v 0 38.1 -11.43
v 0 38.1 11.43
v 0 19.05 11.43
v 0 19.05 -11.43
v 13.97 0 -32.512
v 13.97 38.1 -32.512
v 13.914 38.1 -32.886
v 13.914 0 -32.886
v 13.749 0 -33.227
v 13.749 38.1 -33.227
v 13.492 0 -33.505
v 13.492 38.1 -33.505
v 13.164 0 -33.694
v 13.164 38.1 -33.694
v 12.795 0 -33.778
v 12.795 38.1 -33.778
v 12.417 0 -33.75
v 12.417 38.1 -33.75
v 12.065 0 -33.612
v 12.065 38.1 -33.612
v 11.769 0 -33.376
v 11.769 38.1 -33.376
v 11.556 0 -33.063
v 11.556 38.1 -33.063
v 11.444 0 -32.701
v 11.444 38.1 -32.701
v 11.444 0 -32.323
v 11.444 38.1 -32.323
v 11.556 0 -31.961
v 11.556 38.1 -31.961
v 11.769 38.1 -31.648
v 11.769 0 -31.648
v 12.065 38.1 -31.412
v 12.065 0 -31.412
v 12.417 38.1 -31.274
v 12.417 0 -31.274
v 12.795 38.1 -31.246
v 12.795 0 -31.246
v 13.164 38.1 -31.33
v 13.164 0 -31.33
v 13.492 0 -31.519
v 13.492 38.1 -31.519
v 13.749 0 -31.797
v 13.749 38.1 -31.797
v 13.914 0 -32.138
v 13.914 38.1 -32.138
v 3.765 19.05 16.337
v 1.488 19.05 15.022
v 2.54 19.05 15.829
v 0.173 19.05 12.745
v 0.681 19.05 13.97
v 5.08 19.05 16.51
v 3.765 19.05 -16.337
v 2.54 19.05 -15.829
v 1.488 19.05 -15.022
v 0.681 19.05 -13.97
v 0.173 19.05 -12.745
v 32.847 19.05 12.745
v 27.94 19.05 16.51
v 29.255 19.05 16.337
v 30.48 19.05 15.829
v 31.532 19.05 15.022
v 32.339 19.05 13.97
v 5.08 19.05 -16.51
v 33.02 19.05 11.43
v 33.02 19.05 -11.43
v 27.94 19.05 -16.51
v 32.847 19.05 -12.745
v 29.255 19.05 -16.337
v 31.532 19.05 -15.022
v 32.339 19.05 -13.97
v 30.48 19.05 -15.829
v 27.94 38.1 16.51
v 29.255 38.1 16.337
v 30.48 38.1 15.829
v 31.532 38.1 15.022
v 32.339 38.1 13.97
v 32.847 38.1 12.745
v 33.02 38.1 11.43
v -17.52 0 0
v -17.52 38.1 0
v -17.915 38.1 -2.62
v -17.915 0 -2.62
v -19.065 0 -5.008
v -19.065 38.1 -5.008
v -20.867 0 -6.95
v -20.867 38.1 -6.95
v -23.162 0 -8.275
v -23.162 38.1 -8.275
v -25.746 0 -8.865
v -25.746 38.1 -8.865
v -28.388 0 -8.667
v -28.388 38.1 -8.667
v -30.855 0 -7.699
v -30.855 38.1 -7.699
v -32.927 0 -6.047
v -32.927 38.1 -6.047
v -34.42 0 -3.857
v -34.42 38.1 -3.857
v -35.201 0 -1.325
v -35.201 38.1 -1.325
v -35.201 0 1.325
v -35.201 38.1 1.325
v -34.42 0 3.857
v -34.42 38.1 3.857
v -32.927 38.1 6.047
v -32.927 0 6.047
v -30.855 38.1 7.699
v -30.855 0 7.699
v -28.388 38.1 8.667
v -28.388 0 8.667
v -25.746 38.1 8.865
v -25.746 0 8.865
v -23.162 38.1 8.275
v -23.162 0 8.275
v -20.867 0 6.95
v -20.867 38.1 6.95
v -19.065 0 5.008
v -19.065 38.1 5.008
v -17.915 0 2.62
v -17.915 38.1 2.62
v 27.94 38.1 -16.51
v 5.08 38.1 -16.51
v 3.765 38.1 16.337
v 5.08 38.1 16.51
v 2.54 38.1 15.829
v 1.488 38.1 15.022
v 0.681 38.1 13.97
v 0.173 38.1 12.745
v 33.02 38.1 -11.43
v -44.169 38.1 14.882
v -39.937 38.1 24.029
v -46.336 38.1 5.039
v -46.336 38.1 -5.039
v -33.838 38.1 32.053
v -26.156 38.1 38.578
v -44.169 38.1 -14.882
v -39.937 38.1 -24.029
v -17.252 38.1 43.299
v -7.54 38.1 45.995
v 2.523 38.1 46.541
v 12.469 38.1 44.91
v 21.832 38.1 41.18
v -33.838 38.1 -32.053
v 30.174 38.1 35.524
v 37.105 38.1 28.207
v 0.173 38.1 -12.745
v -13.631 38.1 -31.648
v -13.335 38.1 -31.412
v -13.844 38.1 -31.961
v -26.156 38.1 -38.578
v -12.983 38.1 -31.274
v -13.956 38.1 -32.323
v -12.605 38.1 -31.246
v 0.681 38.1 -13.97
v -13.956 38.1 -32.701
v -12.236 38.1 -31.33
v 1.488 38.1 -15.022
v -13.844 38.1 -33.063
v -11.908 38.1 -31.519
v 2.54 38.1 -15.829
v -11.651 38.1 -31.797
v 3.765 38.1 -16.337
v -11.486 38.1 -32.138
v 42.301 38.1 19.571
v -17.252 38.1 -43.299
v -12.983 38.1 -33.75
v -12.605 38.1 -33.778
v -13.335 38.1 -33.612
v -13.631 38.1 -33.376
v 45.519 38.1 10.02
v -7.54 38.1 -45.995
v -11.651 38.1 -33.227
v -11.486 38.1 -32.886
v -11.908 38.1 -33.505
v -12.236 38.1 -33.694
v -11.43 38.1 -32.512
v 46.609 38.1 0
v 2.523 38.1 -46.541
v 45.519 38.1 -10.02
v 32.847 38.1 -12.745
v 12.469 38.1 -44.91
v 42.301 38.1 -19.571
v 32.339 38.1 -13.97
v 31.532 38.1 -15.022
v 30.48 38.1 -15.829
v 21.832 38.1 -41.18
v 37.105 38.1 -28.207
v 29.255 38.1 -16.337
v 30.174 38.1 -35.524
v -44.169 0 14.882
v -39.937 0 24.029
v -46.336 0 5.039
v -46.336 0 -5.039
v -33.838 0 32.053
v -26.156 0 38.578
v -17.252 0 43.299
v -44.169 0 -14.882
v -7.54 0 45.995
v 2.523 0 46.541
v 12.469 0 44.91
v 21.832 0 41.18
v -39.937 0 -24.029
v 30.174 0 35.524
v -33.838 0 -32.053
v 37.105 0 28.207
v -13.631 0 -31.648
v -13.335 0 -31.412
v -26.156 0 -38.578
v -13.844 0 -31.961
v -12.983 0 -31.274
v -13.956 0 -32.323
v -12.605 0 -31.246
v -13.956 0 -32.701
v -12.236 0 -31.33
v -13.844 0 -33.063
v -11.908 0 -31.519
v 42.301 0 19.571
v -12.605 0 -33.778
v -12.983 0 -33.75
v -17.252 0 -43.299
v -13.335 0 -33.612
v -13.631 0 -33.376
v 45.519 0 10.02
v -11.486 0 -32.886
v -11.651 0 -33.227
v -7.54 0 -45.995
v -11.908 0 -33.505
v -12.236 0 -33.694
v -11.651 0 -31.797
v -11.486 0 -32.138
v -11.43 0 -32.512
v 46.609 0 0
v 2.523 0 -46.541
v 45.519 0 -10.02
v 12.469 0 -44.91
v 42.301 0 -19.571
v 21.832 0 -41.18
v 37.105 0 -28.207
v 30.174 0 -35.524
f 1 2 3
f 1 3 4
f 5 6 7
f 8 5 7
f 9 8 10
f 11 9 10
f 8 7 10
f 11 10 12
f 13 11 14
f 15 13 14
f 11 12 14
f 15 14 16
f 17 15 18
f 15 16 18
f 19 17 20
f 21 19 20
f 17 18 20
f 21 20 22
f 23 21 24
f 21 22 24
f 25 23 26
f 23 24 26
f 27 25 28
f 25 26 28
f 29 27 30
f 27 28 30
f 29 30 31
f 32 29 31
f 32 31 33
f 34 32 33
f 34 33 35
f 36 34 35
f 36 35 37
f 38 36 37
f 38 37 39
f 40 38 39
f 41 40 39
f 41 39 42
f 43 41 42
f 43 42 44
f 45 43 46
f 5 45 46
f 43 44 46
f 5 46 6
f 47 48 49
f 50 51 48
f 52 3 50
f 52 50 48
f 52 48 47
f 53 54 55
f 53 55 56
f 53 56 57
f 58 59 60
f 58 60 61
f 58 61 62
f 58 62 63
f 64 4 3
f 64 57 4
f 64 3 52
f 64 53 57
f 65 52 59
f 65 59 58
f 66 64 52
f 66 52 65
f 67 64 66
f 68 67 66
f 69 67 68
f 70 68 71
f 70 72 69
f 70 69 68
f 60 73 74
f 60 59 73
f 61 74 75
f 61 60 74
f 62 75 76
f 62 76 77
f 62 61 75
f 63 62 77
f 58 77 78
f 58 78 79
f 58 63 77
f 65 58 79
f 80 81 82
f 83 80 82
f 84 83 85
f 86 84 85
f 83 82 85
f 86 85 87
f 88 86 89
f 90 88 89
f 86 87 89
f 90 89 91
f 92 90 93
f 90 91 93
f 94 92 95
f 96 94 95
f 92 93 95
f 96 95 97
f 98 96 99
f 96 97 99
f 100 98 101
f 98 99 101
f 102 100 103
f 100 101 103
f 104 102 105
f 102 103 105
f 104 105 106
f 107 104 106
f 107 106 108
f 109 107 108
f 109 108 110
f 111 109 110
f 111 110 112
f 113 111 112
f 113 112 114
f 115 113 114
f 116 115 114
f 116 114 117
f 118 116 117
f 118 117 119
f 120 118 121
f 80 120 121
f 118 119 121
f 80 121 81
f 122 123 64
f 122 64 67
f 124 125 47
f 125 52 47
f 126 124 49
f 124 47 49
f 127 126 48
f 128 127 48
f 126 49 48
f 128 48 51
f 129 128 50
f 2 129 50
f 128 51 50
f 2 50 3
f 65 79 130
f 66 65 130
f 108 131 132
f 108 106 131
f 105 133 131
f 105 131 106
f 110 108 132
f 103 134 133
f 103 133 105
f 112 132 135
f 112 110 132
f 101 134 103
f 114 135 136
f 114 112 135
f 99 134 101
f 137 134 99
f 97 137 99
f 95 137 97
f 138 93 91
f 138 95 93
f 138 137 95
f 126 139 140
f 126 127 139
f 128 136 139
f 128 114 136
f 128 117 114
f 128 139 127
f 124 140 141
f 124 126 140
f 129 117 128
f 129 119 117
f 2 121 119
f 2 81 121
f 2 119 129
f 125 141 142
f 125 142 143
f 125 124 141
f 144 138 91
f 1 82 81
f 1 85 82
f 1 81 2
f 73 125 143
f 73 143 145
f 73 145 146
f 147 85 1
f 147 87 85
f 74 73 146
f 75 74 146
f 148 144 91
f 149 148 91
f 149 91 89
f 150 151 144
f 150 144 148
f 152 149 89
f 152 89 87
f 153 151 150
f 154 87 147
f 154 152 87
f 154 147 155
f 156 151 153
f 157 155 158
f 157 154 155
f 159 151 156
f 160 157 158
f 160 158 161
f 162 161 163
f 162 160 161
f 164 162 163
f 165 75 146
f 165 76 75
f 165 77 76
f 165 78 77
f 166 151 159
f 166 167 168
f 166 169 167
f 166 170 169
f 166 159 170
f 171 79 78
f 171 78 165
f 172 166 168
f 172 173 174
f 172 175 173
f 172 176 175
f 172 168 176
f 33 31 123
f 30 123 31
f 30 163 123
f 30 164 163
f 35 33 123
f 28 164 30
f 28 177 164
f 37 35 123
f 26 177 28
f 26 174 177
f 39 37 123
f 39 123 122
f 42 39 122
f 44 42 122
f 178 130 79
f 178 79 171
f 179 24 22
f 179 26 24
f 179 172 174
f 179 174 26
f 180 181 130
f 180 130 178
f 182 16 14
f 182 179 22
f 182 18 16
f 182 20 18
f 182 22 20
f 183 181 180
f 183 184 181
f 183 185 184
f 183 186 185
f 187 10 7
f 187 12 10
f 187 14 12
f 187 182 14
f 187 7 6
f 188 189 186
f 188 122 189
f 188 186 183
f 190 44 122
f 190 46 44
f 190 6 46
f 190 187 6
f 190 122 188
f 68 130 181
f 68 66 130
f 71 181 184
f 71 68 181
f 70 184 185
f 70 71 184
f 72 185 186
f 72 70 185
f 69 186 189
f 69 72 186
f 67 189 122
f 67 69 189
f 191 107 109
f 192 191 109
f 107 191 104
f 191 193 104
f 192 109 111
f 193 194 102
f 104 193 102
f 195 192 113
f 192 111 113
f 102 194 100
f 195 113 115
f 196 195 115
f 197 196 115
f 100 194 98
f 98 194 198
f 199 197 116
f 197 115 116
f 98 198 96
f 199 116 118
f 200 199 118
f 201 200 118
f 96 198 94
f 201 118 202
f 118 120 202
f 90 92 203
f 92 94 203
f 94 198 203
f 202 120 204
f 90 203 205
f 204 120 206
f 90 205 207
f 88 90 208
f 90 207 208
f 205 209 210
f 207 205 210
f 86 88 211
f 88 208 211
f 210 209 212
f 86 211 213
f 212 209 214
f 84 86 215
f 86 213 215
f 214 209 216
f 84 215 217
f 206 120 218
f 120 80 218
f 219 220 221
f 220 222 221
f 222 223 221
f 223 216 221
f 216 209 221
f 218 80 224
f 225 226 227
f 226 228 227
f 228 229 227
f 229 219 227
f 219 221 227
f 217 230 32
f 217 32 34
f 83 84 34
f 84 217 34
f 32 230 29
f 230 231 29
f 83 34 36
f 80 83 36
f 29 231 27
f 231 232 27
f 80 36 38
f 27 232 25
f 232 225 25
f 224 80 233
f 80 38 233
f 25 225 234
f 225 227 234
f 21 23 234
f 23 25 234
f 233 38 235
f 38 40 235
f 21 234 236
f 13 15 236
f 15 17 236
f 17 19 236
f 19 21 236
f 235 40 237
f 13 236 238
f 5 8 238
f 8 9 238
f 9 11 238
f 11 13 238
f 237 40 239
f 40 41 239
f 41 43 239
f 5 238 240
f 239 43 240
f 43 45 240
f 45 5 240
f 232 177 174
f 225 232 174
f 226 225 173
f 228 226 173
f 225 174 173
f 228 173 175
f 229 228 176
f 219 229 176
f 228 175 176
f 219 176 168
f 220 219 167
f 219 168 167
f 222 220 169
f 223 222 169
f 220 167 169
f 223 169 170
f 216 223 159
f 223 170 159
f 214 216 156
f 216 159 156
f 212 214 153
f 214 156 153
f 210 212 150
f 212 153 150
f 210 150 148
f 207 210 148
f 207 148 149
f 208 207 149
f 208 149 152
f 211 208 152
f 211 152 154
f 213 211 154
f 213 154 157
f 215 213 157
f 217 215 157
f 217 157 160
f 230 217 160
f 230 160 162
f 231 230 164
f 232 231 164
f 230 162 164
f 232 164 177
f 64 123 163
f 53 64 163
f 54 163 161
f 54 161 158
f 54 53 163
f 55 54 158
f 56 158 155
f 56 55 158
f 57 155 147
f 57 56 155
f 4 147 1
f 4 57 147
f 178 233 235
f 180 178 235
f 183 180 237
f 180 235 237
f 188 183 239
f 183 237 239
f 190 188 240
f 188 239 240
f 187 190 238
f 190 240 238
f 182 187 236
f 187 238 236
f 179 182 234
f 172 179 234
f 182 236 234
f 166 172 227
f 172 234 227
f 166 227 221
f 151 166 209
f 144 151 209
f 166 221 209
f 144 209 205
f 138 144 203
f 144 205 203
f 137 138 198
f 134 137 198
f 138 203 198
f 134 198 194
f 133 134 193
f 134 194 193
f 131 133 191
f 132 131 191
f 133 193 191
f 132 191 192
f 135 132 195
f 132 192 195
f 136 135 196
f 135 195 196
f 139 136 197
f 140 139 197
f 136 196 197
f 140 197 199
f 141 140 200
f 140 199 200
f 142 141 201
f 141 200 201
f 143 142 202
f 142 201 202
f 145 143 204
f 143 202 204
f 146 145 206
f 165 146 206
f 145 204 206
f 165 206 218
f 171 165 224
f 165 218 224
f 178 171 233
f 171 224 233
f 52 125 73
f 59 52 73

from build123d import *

# Parameters (mm, degrees)
SKETCH1_R           = 46.609
BOSS_EXTRUDE1_DEPTH = 38.1
SKETCH2_R           = 1.27
CUT_EXTRUDE1_DEPTH  = 38.1
SKETCH3_R           = 8.89
CUT_EXTRUDE2_DEPTH  = 38.1
SKETCH4_W           = 33.02
SKETCH4_H           = 33.02
CUT_EXTRUDE3_DEPTH  = 19.05
FILLET1_R           = 5.08


with BuildPart() as part:
    # Sketch1 → Boss-Extrude1 (new body)
    with BuildSketch(Plane(origin=(0, 0, 0), x_dir=(1, 0, 0), z_dir=(0, 1, 0))):
        Circle(SKETCH1_R)
    extrude(amount=BOSS_EXTRUDE1_DEPTH)

    # Sketch2 → Cut-Extrude1 (cut)
    with BuildSketch(Plane(origin=(0, 38.1, 0), x_dir=(1, 0, 0), z_dir=(0, 1, 0))):
        with Locations((12.7, 32.512)):
            Circle(SKETCH2_R)
        with Locations((-12.7, 32.512)):
            Circle(SKETCH2_R)
    extrude(amount=-CUT_EXTRUDE1_DEPTH, mode=Mode.SUBTRACT)

    # Sketch3 → Cut-Extrude2 (cut)
    with BuildSketch(Plane(origin=(0, 38.1, 0), x_dir=(1, 0, 0), z_dir=(0, 1, 0))):
        with Locations((-26.409958794, 0)):
            Circle(SKETCH3_R)
    extrude(amount=-CUT_EXTRUDE2_DEPTH, mode=Mode.SUBTRACT)

    # Sketch4 → Cut-Extrude3 (cut)
    with BuildSketch(Plane(origin=(0, 38.1, 0), x_dir=(1, 0, 0), z_dir=(0, 1, 0))):
        with Locations((16.51, 0)):
            Rectangle(SKETCH4_W, SKETCH4_H)
    extrude(amount=-CUT_EXTRUDE3_DEPTH, mode=Mode.SUBTRACT)

    # Fillet1
    fillet1_edges = [part.edges().sort_by_distance(p)[0] for p in [
        (0, 28.575, 16.51),
        (0, 28.575, -16.51),
        (33.02, 28.575, -16.51),
        (33.02, 28.575, 16.51),
    ]]
    fillet(fillet1_edges, radius=FILLET1_R)


solid = part.part
